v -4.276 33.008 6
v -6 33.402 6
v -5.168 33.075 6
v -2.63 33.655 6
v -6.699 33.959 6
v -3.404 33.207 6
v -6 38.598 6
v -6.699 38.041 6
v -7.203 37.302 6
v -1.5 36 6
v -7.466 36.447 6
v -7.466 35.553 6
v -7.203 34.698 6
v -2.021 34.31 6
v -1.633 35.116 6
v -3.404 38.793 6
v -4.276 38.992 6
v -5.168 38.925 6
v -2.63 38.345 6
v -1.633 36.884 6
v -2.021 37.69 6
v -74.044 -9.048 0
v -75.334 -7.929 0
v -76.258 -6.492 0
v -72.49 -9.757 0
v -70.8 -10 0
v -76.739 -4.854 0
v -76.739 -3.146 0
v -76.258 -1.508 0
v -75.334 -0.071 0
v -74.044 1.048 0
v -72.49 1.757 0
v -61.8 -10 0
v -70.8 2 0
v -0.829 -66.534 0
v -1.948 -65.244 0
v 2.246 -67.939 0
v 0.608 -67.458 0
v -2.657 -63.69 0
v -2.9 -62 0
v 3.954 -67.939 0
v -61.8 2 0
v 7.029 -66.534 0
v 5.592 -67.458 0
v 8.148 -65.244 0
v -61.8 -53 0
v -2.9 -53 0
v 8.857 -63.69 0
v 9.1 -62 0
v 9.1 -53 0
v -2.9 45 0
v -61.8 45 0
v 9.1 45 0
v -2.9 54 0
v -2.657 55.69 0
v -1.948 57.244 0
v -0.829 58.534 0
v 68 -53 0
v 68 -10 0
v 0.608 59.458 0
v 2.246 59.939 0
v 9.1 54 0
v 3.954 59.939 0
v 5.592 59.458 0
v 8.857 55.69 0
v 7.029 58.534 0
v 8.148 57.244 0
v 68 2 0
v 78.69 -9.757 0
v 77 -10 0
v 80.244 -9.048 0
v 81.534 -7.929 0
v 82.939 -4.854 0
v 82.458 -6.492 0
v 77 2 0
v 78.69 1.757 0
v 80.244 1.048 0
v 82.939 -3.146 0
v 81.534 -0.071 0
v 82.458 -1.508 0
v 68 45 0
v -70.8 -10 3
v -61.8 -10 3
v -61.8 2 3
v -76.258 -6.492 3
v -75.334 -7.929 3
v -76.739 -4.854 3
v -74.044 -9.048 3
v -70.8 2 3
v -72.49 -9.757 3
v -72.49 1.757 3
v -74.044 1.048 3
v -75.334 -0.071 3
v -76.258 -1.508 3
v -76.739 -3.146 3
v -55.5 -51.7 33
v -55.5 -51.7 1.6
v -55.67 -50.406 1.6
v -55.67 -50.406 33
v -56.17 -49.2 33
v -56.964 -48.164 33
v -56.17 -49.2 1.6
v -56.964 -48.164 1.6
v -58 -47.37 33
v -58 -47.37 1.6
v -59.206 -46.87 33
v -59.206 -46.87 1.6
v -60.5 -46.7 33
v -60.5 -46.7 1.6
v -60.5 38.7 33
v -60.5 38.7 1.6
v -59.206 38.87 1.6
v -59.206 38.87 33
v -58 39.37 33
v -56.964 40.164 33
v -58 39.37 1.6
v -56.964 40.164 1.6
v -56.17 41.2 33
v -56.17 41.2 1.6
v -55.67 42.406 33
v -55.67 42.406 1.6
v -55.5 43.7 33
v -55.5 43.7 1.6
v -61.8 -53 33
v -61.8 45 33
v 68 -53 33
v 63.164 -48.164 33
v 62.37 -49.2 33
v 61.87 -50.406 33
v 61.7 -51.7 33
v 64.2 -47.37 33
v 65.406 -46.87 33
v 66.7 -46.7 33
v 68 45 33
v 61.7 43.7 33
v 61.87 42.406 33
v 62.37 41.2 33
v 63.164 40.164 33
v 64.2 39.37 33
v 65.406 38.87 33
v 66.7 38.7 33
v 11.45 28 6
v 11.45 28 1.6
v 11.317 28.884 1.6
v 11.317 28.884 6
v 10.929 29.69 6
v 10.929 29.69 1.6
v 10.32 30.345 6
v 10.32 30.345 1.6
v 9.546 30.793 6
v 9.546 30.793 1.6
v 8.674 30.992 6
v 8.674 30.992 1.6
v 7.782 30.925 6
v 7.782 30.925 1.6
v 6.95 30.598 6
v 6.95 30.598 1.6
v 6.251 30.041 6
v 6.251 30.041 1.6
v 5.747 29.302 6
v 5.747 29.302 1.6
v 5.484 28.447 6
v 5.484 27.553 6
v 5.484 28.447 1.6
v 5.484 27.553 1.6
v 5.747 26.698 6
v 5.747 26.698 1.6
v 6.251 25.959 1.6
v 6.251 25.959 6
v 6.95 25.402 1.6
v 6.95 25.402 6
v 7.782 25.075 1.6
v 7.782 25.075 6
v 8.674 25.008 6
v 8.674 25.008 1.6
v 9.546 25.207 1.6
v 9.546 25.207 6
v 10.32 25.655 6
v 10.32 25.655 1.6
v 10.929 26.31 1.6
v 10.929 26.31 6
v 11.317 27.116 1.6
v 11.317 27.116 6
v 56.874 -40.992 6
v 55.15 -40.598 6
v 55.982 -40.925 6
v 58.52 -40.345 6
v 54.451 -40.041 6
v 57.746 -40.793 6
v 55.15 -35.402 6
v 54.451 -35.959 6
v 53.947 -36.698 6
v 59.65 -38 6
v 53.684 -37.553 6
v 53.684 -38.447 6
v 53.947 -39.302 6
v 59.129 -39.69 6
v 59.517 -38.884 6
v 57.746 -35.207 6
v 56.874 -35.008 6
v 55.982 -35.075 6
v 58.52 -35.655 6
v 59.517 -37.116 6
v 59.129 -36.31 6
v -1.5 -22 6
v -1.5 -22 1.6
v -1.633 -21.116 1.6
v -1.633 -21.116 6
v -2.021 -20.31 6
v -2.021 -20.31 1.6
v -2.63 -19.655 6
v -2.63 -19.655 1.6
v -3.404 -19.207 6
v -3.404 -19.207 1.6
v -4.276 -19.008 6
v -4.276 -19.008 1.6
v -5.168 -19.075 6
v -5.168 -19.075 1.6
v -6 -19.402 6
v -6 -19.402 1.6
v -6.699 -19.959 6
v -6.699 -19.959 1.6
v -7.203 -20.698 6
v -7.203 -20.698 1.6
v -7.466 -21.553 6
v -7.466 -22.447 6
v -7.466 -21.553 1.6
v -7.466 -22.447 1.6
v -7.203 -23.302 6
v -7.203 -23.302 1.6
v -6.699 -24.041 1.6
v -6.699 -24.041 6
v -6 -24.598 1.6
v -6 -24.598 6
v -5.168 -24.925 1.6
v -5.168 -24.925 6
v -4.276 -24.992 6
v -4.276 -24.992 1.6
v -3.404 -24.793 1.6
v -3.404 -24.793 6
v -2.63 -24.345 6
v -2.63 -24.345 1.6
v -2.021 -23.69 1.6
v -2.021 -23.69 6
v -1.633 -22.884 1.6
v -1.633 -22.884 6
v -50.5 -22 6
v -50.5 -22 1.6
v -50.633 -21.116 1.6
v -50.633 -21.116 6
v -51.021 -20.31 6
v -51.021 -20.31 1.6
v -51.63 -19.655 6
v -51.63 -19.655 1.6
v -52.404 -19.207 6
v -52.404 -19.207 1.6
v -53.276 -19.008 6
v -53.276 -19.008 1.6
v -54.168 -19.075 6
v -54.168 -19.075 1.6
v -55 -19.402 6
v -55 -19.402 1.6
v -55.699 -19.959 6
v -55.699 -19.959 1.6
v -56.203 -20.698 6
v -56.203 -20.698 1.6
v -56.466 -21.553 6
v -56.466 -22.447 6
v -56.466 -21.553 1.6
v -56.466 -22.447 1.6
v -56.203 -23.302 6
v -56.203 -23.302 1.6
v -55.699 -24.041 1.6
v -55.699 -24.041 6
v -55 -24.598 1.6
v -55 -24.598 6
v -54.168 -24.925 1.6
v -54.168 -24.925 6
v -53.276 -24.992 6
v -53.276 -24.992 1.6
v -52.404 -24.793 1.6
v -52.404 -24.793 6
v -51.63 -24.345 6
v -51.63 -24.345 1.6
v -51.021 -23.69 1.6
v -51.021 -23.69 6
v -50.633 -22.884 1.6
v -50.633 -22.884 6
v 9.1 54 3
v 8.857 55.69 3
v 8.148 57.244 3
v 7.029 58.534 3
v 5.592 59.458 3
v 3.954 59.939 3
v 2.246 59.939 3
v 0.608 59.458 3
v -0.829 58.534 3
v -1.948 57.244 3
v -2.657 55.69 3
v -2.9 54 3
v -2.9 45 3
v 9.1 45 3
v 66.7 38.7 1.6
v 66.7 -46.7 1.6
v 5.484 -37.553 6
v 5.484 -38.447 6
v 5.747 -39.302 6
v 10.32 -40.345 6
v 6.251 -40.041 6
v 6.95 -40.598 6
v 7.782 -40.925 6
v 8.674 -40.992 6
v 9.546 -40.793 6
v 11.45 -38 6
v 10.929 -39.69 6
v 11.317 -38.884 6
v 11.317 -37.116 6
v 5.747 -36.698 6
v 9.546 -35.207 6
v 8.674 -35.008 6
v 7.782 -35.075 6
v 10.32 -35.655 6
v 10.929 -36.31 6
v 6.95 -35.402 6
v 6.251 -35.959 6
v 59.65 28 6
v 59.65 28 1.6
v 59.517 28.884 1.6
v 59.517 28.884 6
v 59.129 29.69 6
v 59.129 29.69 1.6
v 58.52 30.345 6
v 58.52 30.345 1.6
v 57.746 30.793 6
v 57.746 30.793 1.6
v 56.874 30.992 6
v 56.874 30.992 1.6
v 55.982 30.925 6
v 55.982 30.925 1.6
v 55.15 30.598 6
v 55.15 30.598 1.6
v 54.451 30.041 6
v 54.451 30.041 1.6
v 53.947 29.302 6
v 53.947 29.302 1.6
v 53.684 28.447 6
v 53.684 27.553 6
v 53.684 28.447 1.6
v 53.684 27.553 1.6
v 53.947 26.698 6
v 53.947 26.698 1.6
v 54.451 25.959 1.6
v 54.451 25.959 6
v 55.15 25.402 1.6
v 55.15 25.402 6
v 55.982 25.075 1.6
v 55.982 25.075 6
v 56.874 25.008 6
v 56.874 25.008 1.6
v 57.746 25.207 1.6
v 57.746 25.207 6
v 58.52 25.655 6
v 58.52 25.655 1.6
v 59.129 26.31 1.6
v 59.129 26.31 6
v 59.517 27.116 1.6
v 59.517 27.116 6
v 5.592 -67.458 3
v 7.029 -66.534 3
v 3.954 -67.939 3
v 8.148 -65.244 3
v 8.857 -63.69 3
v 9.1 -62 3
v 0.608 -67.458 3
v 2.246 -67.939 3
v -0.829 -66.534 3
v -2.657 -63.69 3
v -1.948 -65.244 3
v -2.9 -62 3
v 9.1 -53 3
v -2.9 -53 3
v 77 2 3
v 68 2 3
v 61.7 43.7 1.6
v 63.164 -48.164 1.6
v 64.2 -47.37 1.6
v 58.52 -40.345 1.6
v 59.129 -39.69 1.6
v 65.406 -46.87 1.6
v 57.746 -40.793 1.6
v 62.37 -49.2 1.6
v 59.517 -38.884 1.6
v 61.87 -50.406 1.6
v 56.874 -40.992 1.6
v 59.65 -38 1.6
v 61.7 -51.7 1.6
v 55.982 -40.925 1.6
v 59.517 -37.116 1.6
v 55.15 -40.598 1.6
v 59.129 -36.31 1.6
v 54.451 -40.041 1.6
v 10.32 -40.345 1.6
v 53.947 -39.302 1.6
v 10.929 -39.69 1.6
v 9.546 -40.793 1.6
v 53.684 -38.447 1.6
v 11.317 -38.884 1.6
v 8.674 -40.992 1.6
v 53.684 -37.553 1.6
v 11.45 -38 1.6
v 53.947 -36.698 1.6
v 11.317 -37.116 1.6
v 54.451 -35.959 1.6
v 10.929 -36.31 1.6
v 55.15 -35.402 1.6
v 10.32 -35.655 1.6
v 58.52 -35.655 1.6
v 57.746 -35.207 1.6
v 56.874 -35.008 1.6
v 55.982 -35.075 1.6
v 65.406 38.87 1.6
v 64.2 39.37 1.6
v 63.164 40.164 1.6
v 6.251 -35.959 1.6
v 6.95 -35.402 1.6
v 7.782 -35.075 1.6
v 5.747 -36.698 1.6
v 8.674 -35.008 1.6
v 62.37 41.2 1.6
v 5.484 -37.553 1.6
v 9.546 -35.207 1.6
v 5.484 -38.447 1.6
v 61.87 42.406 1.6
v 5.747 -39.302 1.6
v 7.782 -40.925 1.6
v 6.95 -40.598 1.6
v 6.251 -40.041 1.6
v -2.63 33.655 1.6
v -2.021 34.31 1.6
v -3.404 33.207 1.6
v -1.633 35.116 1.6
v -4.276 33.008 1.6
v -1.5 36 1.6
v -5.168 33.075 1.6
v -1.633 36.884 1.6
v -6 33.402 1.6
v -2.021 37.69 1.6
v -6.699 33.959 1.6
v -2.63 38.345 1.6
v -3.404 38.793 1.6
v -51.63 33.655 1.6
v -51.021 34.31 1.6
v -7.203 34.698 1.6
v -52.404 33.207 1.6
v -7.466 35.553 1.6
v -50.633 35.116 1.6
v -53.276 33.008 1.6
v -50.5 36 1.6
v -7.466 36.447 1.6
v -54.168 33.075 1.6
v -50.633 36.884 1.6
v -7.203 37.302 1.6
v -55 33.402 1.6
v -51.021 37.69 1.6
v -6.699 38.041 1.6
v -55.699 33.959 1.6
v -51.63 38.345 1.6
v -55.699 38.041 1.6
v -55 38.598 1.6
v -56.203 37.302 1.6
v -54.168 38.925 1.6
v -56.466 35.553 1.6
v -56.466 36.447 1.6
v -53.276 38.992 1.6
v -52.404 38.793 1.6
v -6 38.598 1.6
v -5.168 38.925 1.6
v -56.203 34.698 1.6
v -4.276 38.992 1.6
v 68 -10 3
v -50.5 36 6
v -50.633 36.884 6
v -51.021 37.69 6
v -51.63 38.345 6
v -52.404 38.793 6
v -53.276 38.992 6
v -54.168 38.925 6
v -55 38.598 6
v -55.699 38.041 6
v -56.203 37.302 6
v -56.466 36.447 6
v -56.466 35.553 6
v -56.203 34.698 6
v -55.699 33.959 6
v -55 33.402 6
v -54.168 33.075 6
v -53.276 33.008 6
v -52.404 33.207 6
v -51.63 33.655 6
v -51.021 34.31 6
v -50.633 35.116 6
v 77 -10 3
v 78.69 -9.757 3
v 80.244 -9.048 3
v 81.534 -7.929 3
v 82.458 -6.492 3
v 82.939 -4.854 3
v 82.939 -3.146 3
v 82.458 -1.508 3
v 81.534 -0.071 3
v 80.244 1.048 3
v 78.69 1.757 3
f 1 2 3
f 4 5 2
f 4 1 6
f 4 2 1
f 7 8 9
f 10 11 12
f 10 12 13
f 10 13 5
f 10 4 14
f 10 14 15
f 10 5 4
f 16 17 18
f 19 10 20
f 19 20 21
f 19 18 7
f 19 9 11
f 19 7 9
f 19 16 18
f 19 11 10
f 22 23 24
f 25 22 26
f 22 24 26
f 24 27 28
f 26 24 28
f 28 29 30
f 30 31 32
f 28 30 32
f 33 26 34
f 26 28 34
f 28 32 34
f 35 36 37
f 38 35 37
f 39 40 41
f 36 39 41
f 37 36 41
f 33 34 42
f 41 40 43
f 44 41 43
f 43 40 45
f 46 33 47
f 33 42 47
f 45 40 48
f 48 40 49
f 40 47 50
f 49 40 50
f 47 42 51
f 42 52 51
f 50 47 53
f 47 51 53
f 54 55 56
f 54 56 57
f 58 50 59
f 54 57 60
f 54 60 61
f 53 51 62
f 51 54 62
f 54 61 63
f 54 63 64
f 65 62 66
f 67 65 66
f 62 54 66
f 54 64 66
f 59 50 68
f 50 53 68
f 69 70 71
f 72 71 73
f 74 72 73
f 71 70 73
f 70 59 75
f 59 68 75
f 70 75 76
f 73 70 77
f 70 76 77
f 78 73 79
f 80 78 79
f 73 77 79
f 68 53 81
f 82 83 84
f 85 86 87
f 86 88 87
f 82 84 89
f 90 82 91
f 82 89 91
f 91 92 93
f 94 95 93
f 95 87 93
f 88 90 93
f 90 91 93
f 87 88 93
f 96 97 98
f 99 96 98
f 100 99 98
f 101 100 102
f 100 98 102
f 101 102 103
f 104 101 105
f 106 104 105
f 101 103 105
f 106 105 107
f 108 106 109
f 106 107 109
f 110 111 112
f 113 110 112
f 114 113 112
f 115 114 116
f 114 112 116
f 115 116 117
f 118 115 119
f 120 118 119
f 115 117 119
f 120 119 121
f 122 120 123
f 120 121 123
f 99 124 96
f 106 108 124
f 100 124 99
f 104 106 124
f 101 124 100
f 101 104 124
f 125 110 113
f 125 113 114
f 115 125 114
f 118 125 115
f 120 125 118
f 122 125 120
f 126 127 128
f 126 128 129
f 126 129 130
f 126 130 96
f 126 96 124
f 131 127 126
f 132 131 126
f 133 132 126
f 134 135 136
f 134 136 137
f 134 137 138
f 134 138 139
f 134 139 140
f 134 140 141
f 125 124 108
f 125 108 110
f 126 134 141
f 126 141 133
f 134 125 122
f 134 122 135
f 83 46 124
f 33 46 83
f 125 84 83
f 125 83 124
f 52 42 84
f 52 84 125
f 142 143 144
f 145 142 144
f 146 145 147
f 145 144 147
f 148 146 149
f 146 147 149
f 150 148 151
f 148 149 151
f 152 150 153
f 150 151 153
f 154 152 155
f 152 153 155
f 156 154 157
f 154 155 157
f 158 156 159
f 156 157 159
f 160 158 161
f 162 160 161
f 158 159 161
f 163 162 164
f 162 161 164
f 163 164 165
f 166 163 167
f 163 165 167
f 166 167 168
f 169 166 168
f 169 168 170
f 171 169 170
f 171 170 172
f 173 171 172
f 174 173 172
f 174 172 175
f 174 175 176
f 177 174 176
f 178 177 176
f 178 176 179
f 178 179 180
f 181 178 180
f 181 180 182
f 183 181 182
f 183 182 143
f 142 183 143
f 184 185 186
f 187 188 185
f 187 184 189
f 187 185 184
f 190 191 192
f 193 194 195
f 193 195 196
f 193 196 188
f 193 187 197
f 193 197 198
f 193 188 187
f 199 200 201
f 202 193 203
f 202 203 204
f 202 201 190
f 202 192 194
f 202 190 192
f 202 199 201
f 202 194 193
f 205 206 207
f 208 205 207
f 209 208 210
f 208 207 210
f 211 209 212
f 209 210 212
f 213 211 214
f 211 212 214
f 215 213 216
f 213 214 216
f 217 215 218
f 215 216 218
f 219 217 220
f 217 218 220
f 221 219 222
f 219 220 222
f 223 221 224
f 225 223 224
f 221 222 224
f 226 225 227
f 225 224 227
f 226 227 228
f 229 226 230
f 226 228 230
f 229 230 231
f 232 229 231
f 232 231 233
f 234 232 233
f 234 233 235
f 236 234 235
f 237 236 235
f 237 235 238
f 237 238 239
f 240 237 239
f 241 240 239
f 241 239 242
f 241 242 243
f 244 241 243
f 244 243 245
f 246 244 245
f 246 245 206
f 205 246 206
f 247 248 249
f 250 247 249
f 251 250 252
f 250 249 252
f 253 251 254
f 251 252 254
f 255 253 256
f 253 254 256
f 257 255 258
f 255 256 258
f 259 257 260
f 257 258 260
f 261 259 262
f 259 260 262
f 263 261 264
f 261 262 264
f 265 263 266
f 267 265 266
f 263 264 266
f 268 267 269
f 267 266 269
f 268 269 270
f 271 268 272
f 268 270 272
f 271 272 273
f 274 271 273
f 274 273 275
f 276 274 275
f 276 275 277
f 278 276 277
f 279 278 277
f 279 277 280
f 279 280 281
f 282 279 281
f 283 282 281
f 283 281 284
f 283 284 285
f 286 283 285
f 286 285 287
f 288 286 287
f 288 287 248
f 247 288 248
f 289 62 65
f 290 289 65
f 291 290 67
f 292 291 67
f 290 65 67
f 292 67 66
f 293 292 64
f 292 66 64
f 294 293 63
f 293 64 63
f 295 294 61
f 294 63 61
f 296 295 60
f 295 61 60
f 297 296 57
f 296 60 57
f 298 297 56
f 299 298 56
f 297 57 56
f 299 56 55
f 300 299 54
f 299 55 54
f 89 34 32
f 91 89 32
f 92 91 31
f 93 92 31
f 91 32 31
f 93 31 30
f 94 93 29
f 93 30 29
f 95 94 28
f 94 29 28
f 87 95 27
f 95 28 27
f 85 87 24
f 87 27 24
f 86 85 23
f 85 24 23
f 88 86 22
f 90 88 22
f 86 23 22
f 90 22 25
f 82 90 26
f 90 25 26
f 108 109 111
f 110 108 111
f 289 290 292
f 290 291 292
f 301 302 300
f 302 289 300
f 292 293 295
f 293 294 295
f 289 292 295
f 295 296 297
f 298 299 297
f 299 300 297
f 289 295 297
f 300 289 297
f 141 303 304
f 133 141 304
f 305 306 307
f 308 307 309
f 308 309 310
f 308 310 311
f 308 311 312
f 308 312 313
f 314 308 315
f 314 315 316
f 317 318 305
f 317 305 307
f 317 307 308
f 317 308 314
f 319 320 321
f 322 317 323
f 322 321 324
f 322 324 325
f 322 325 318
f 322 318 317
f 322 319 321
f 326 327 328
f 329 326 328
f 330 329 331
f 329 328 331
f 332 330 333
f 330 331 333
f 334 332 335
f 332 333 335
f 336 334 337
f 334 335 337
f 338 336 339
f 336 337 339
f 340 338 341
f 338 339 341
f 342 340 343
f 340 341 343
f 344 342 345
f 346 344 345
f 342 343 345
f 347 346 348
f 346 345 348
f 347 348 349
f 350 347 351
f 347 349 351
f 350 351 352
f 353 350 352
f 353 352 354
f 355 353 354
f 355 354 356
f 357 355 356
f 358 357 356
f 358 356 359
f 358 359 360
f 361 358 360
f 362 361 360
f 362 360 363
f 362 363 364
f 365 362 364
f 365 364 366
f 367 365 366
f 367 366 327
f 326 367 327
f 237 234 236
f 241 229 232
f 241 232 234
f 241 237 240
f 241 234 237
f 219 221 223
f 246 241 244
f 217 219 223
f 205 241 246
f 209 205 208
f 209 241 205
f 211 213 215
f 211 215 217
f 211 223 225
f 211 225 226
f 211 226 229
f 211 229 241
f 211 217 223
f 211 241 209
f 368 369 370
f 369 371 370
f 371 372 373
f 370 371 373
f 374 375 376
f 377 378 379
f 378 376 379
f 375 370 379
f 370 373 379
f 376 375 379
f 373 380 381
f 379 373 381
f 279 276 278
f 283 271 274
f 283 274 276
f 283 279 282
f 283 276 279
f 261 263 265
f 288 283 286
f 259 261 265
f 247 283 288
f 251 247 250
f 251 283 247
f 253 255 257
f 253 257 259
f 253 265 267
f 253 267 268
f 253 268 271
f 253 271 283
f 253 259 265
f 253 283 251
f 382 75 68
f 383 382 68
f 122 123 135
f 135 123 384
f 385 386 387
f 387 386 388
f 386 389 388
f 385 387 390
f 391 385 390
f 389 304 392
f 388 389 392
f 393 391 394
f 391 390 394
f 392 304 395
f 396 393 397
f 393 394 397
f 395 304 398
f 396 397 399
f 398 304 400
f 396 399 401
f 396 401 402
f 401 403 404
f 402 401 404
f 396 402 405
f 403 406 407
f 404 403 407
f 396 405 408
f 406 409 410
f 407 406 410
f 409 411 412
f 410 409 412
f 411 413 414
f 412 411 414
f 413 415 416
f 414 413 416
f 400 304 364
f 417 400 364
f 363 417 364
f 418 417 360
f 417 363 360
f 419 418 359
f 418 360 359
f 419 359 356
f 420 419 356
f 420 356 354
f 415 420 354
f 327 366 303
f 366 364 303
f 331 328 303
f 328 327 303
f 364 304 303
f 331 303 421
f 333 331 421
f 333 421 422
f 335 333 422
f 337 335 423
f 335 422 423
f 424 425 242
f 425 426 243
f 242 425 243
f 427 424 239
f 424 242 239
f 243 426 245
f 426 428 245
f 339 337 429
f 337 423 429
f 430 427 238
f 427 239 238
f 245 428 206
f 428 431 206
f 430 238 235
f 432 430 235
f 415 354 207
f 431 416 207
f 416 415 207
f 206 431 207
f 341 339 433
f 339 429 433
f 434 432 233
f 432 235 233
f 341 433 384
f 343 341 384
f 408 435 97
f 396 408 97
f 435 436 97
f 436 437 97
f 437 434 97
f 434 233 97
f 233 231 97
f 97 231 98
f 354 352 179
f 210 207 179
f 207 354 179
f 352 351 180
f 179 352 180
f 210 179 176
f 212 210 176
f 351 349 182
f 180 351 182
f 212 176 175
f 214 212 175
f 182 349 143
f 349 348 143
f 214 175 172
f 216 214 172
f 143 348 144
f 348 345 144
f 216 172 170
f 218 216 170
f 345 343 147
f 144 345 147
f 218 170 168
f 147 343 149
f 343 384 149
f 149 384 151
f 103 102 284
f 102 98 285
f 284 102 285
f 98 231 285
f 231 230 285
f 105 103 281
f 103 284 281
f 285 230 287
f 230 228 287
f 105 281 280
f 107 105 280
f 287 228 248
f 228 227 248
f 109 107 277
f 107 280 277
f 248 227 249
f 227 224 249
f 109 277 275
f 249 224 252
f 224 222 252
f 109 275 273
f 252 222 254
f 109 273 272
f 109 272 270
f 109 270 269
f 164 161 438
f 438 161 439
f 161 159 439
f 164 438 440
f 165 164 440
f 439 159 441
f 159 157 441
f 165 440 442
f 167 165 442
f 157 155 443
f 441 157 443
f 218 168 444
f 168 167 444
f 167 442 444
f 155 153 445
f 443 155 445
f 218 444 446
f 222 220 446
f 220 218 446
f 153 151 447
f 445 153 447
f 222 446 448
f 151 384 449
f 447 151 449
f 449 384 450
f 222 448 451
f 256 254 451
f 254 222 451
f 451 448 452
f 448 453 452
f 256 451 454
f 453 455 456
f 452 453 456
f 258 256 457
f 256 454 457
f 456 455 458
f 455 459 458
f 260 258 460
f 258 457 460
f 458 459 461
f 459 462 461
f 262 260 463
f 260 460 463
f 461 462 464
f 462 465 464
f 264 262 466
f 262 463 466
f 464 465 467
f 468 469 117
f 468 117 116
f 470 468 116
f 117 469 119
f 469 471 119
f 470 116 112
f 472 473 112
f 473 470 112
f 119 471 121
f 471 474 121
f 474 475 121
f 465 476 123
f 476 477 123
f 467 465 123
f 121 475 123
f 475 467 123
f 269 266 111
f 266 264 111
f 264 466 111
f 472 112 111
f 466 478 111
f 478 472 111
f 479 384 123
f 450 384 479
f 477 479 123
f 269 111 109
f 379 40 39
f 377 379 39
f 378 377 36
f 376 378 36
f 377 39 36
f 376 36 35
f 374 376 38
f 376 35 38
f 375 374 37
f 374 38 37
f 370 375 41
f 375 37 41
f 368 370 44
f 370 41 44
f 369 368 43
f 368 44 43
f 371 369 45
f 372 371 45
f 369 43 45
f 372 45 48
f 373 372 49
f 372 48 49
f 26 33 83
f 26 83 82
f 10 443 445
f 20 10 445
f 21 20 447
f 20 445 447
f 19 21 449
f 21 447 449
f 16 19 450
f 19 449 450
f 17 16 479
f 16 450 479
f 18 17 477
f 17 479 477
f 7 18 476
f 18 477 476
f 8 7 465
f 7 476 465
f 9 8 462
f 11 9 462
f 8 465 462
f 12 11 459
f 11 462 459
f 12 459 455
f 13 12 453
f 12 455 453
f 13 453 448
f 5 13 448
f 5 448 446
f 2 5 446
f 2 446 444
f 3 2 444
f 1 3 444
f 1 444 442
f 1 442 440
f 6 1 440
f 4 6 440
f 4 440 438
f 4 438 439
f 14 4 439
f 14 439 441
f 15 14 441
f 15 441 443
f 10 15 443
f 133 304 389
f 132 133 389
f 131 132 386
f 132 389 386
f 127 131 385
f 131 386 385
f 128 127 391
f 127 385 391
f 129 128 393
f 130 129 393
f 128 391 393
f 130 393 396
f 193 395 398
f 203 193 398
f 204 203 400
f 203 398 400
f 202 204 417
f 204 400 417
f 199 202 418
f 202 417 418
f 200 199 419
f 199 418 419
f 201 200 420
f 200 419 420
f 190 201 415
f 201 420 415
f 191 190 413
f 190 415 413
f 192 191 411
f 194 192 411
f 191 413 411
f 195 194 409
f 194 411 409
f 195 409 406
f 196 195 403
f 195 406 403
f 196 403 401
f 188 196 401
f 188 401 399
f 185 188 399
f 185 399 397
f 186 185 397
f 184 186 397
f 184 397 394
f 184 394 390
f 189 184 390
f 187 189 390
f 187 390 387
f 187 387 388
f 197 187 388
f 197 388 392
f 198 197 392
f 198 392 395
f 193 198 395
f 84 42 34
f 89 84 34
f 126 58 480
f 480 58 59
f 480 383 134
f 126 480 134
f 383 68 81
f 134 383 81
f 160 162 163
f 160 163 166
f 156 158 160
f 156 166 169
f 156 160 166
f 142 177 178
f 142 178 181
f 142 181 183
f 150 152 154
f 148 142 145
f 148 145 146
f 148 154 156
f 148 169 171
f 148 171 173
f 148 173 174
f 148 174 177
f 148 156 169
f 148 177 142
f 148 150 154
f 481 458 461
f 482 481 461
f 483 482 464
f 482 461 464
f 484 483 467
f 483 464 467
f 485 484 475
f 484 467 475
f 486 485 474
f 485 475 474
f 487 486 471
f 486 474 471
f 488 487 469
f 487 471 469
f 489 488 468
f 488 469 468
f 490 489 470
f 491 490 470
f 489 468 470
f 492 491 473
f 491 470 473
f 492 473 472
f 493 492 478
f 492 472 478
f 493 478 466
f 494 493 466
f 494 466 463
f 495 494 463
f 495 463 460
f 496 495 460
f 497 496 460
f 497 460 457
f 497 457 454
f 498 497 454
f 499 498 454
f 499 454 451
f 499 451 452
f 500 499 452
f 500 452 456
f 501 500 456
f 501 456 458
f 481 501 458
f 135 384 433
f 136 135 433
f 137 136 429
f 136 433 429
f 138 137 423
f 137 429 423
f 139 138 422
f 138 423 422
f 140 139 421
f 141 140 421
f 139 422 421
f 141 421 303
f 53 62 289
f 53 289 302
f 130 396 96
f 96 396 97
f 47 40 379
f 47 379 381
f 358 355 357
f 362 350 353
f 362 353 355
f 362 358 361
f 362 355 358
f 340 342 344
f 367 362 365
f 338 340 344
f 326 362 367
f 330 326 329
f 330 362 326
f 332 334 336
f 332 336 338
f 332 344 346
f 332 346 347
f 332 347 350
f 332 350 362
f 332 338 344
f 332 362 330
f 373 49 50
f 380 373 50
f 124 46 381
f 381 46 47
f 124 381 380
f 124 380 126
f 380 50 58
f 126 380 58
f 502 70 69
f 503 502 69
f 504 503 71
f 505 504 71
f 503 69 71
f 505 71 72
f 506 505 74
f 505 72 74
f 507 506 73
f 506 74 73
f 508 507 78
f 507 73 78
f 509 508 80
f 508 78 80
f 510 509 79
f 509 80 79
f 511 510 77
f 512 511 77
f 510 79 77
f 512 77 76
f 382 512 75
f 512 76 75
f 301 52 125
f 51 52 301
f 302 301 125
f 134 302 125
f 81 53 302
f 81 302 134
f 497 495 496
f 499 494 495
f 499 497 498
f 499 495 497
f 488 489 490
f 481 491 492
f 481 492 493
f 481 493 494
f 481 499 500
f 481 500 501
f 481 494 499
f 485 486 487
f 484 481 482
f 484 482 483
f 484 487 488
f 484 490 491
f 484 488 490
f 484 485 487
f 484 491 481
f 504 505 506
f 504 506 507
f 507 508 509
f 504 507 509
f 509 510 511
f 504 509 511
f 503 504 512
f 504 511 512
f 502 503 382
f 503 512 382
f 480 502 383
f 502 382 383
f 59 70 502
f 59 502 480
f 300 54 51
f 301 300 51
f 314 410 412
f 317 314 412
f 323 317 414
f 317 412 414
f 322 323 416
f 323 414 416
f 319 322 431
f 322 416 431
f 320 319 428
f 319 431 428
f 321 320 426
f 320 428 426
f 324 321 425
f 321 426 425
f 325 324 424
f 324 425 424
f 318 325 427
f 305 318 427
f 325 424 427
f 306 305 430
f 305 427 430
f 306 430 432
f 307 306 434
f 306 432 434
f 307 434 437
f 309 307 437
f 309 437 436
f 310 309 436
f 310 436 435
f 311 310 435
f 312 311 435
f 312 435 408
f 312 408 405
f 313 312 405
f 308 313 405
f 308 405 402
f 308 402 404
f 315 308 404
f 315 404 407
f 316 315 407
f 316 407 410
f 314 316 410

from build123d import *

# Parameters (mm, degrees)
SKETCH008_R  = 3
PAD008_DEPTH = 6
SKETCH004_R  = 3
PAD004_DEPTH = 6
PAD001_DEPTH = 1.6
PAD_DEPTH    = 3
SKETCH002_W  = 129.8
SKETCH002_H  = 98
PAD002_DEPTH = 33
SKETCH005_R  = 3
PAD005_DEPTH = 6
SKETCH006_R  = 3
PAD006_DEPTH = 6
SKETCH007_R  = 3
PAD007_DEPTH = 6
SKETCH009_R  = 3
PAD009_DEPTH = 6
SKETCH010_R  = 3
PAD010_DEPTH = 6
SKETCH011_R  = 3
PAD011_DEPTH = 6


with BuildPart() as body008:
    # Sketch008 → Pad008 (new body)
    with BuildSketch(Plane.XY):
        with Locations((8.45, 28)):
            Circle(SKETCH008_R)
    extrude(amount=PAD008_DEPTH)


with BuildPart() as body004:
    # Sketch004 → Pad004 (new body)
    with BuildSketch(Plane.XY):
        with Locations((-53.5, 36)):
            Circle(SKETCH004_R)
    extrude(amount=PAD004_DEPTH)


with BuildPart() as body001:
    # Sketch001 → Pad001 (new body)
    with BuildSketch(Plane.XY):
        with BuildLine():
            Line((-55.5, 43.7), (61.7, 43.7))
            ThreePointArc((61.7, 43.7), (63.164466, 40.164466), (66.7, 38.7))
            Line((66.7, 38.7), (66.7, -46.7))
            ThreePointArc((66.7, -46.7), (63.164466, -48.164466), (61.7, -51.7))
            Line((61.7, -51.7), (-55.5, -51.7))
            ThreePointArc((-55.5, -51.7), (-56.964466, -48.164466), (-60.5, -46.7))
            Line((-60.5, -46.7), (-60.5, 38.7))
            ThreePointArc((-60.5, 38.7), (-56.964466, 40.164466), (-55.5, 43.7))
        make_face()
    extrude(amount=PAD001_DEPTH)


with BuildPart() as fusion:
    # Sketch → Pad (new body)
    with BuildSketch(Plane.XY):
        with BuildLine():
            Line((-61.8, 45), (-2.9, 45))
            Line((-2.9, 54), (-2.9, 45))
            ThreePointArc((9.1, 54), (3.1, 60), (-2.9, 54))
            Line((9.1, 54), (9.1, 45))
            Line((9.1, 45), (68, 45))
            Line((68, 45), (68, 2))
            Line((77, 2), (68, 2))
            ThreePointArc((77, -10), (83, -4), (77, 2))
            Line((77, -10), (68, -10))
            Line((68, -10), (68, -53))
            Line((68, -53), (9.1, -53))
            Line((9.1, -62), (9.1, -53))
            ThreePointArc((-2.9, -62), (3.1, -68), (9.1, -62))
            Line((-2.9, -62), (-2.9, -53))
            Line((-2.9, -53), (-61.8, -53))
            Line((-61.8, -53), (-61.8, -10))
            Line((-61.8, -10), (-70.8, -10))
            ThreePointArc((-70.8, 2), (-76.8, -4), (-70.8, -10))
            Line((-61.8, 2), (-70.8, 2))
            Line((-61.8, 2), (-61.8, 45))
        make_face()
        with BuildLine():
            Line((-55.5, 43.7), (61.7, 43.7))
            ThreePointArc((61.7, 43.7), (63.164466, 40.164466), (66.7, 38.7))
            Line((66.7, 38.7), (66.7, -46.7))
            ThreePointArc((66.7, -46.7), (63.164466, -48.164466), (61.7, -51.7))
            Line((61.7, -51.7), (-55.5, -51.7))
            ThreePointArc((-55.5, -51.7), (-56.964466, -48.164466), (-60.5, -46.7))
            Line((-60.5, -46.7), (-60.5, 38.7))
            ThreePointArc((-60.5, 38.7), (-56.964466, 40.164466), (-55.5, 43.7))
        make_face(mode=Mode.SUBTRACT)
    extrude(amount=PAD_DEPTH)

    # Fusion: union Body001
    add(body001.part)


with BuildPart() as fusion002:
    # Sketch002 → Pad002 (new body)
    with BuildSketch(Plane.XY):
        with Locations((3.1, -4)):
            Rectangle(SKETCH002_W, SKETCH002_H)
        with BuildLine():
            Line((-55.5, 43.7), (61.7, 43.7))
            ThreePointArc((61.7, 43.7), (63.164466, 40.164466), (66.7, 38.7))
            Line((66.7, 38.7), (66.7, -46.7))
            ThreePointArc((66.7, -46.7), (63.164466, -48.164466), (61.7, -51.7))
            Line((61.7, -51.7), (-55.5, -51.7))
            ThreePointArc((-55.5, -51.7), (-56.964466, -48.164466), (-60.5, -46.7))
            Line((-60.5, -46.7), (-60.5, 38.7))
            ThreePointArc((-60.5, 38.7), (-56.964466, 40.164466), (-55.5, 43.7))
        make_face(mode=Mode.SUBTRACT)
    extrude(amount=PAD002_DEPTH)

    # Fusion001: union Fusion
    add(fusion.part)

    # Fusion002: union Body004
    add(body004.part)


with BuildPart() as fusion003:
    # Sketch005 → Pad005 (new body)
    with BuildSketch(Plane.XY):
        with Locations((-4.5, 36)):
            Circle(SKETCH005_R)
    extrude(amount=PAD005_DEPTH)

    # Fusion003: union Fusion002
    add(fusion002.part)


with BuildPart() as fusion004:
    # Sketch006 → Pad006 (new body)
    with BuildSketch(Plane.XY):
        with Locations((-4.5, -22)):
            Circle(SKETCH006_R)
    extrude(amount=PAD006_DEPTH)

    # Fusion004: union Fusion003
    add(fusion003.part)


with BuildPart() as fusion006:
    # Sketch007 → Pad007 (new body)
    with BuildSketch(Plane.XY):
        with Locations((-53.5, -22)):
            Circle(SKETCH007_R)
    extrude(amount=PAD007_DEPTH)

    # Fusion005: union Fusion004
    add(fusion004.part)

    # Fusion006: union Body008
    add(body008.part)


with BuildPart() as fusion007:
    # Sketch009 → Pad009 (new body)
    with BuildSketch(Plane.XY):
        with Locations((56.65, 28)):
            Circle(SKETCH009_R)
    extrude(amount=PAD009_DEPTH)

    # Fusion007: union Fusion006
    add(fusion006.part)


with BuildPart() as fusion008:
    # Sketch010 → Pad010 (new body)
    with BuildSketch(Plane.XY):
        with Locations((56.65, -38)):
            Circle(SKETCH010_R)
    extrude(amount=PAD010_DEPTH)

    # Fusion008: union Fusion007
    add(fusion007.part)


with BuildPart() as fusion009:
    # Sketch011 → Pad011 (new body)
    with BuildSketch(Plane.XY):
        with Locations((8.45, -38)):
            Circle(SKETCH011_R)
    extrude(amount=PAD011_DEPTH)

    # Fusion009: union Fusion008
    add(fusion008.part)


solid = fusion009.part
